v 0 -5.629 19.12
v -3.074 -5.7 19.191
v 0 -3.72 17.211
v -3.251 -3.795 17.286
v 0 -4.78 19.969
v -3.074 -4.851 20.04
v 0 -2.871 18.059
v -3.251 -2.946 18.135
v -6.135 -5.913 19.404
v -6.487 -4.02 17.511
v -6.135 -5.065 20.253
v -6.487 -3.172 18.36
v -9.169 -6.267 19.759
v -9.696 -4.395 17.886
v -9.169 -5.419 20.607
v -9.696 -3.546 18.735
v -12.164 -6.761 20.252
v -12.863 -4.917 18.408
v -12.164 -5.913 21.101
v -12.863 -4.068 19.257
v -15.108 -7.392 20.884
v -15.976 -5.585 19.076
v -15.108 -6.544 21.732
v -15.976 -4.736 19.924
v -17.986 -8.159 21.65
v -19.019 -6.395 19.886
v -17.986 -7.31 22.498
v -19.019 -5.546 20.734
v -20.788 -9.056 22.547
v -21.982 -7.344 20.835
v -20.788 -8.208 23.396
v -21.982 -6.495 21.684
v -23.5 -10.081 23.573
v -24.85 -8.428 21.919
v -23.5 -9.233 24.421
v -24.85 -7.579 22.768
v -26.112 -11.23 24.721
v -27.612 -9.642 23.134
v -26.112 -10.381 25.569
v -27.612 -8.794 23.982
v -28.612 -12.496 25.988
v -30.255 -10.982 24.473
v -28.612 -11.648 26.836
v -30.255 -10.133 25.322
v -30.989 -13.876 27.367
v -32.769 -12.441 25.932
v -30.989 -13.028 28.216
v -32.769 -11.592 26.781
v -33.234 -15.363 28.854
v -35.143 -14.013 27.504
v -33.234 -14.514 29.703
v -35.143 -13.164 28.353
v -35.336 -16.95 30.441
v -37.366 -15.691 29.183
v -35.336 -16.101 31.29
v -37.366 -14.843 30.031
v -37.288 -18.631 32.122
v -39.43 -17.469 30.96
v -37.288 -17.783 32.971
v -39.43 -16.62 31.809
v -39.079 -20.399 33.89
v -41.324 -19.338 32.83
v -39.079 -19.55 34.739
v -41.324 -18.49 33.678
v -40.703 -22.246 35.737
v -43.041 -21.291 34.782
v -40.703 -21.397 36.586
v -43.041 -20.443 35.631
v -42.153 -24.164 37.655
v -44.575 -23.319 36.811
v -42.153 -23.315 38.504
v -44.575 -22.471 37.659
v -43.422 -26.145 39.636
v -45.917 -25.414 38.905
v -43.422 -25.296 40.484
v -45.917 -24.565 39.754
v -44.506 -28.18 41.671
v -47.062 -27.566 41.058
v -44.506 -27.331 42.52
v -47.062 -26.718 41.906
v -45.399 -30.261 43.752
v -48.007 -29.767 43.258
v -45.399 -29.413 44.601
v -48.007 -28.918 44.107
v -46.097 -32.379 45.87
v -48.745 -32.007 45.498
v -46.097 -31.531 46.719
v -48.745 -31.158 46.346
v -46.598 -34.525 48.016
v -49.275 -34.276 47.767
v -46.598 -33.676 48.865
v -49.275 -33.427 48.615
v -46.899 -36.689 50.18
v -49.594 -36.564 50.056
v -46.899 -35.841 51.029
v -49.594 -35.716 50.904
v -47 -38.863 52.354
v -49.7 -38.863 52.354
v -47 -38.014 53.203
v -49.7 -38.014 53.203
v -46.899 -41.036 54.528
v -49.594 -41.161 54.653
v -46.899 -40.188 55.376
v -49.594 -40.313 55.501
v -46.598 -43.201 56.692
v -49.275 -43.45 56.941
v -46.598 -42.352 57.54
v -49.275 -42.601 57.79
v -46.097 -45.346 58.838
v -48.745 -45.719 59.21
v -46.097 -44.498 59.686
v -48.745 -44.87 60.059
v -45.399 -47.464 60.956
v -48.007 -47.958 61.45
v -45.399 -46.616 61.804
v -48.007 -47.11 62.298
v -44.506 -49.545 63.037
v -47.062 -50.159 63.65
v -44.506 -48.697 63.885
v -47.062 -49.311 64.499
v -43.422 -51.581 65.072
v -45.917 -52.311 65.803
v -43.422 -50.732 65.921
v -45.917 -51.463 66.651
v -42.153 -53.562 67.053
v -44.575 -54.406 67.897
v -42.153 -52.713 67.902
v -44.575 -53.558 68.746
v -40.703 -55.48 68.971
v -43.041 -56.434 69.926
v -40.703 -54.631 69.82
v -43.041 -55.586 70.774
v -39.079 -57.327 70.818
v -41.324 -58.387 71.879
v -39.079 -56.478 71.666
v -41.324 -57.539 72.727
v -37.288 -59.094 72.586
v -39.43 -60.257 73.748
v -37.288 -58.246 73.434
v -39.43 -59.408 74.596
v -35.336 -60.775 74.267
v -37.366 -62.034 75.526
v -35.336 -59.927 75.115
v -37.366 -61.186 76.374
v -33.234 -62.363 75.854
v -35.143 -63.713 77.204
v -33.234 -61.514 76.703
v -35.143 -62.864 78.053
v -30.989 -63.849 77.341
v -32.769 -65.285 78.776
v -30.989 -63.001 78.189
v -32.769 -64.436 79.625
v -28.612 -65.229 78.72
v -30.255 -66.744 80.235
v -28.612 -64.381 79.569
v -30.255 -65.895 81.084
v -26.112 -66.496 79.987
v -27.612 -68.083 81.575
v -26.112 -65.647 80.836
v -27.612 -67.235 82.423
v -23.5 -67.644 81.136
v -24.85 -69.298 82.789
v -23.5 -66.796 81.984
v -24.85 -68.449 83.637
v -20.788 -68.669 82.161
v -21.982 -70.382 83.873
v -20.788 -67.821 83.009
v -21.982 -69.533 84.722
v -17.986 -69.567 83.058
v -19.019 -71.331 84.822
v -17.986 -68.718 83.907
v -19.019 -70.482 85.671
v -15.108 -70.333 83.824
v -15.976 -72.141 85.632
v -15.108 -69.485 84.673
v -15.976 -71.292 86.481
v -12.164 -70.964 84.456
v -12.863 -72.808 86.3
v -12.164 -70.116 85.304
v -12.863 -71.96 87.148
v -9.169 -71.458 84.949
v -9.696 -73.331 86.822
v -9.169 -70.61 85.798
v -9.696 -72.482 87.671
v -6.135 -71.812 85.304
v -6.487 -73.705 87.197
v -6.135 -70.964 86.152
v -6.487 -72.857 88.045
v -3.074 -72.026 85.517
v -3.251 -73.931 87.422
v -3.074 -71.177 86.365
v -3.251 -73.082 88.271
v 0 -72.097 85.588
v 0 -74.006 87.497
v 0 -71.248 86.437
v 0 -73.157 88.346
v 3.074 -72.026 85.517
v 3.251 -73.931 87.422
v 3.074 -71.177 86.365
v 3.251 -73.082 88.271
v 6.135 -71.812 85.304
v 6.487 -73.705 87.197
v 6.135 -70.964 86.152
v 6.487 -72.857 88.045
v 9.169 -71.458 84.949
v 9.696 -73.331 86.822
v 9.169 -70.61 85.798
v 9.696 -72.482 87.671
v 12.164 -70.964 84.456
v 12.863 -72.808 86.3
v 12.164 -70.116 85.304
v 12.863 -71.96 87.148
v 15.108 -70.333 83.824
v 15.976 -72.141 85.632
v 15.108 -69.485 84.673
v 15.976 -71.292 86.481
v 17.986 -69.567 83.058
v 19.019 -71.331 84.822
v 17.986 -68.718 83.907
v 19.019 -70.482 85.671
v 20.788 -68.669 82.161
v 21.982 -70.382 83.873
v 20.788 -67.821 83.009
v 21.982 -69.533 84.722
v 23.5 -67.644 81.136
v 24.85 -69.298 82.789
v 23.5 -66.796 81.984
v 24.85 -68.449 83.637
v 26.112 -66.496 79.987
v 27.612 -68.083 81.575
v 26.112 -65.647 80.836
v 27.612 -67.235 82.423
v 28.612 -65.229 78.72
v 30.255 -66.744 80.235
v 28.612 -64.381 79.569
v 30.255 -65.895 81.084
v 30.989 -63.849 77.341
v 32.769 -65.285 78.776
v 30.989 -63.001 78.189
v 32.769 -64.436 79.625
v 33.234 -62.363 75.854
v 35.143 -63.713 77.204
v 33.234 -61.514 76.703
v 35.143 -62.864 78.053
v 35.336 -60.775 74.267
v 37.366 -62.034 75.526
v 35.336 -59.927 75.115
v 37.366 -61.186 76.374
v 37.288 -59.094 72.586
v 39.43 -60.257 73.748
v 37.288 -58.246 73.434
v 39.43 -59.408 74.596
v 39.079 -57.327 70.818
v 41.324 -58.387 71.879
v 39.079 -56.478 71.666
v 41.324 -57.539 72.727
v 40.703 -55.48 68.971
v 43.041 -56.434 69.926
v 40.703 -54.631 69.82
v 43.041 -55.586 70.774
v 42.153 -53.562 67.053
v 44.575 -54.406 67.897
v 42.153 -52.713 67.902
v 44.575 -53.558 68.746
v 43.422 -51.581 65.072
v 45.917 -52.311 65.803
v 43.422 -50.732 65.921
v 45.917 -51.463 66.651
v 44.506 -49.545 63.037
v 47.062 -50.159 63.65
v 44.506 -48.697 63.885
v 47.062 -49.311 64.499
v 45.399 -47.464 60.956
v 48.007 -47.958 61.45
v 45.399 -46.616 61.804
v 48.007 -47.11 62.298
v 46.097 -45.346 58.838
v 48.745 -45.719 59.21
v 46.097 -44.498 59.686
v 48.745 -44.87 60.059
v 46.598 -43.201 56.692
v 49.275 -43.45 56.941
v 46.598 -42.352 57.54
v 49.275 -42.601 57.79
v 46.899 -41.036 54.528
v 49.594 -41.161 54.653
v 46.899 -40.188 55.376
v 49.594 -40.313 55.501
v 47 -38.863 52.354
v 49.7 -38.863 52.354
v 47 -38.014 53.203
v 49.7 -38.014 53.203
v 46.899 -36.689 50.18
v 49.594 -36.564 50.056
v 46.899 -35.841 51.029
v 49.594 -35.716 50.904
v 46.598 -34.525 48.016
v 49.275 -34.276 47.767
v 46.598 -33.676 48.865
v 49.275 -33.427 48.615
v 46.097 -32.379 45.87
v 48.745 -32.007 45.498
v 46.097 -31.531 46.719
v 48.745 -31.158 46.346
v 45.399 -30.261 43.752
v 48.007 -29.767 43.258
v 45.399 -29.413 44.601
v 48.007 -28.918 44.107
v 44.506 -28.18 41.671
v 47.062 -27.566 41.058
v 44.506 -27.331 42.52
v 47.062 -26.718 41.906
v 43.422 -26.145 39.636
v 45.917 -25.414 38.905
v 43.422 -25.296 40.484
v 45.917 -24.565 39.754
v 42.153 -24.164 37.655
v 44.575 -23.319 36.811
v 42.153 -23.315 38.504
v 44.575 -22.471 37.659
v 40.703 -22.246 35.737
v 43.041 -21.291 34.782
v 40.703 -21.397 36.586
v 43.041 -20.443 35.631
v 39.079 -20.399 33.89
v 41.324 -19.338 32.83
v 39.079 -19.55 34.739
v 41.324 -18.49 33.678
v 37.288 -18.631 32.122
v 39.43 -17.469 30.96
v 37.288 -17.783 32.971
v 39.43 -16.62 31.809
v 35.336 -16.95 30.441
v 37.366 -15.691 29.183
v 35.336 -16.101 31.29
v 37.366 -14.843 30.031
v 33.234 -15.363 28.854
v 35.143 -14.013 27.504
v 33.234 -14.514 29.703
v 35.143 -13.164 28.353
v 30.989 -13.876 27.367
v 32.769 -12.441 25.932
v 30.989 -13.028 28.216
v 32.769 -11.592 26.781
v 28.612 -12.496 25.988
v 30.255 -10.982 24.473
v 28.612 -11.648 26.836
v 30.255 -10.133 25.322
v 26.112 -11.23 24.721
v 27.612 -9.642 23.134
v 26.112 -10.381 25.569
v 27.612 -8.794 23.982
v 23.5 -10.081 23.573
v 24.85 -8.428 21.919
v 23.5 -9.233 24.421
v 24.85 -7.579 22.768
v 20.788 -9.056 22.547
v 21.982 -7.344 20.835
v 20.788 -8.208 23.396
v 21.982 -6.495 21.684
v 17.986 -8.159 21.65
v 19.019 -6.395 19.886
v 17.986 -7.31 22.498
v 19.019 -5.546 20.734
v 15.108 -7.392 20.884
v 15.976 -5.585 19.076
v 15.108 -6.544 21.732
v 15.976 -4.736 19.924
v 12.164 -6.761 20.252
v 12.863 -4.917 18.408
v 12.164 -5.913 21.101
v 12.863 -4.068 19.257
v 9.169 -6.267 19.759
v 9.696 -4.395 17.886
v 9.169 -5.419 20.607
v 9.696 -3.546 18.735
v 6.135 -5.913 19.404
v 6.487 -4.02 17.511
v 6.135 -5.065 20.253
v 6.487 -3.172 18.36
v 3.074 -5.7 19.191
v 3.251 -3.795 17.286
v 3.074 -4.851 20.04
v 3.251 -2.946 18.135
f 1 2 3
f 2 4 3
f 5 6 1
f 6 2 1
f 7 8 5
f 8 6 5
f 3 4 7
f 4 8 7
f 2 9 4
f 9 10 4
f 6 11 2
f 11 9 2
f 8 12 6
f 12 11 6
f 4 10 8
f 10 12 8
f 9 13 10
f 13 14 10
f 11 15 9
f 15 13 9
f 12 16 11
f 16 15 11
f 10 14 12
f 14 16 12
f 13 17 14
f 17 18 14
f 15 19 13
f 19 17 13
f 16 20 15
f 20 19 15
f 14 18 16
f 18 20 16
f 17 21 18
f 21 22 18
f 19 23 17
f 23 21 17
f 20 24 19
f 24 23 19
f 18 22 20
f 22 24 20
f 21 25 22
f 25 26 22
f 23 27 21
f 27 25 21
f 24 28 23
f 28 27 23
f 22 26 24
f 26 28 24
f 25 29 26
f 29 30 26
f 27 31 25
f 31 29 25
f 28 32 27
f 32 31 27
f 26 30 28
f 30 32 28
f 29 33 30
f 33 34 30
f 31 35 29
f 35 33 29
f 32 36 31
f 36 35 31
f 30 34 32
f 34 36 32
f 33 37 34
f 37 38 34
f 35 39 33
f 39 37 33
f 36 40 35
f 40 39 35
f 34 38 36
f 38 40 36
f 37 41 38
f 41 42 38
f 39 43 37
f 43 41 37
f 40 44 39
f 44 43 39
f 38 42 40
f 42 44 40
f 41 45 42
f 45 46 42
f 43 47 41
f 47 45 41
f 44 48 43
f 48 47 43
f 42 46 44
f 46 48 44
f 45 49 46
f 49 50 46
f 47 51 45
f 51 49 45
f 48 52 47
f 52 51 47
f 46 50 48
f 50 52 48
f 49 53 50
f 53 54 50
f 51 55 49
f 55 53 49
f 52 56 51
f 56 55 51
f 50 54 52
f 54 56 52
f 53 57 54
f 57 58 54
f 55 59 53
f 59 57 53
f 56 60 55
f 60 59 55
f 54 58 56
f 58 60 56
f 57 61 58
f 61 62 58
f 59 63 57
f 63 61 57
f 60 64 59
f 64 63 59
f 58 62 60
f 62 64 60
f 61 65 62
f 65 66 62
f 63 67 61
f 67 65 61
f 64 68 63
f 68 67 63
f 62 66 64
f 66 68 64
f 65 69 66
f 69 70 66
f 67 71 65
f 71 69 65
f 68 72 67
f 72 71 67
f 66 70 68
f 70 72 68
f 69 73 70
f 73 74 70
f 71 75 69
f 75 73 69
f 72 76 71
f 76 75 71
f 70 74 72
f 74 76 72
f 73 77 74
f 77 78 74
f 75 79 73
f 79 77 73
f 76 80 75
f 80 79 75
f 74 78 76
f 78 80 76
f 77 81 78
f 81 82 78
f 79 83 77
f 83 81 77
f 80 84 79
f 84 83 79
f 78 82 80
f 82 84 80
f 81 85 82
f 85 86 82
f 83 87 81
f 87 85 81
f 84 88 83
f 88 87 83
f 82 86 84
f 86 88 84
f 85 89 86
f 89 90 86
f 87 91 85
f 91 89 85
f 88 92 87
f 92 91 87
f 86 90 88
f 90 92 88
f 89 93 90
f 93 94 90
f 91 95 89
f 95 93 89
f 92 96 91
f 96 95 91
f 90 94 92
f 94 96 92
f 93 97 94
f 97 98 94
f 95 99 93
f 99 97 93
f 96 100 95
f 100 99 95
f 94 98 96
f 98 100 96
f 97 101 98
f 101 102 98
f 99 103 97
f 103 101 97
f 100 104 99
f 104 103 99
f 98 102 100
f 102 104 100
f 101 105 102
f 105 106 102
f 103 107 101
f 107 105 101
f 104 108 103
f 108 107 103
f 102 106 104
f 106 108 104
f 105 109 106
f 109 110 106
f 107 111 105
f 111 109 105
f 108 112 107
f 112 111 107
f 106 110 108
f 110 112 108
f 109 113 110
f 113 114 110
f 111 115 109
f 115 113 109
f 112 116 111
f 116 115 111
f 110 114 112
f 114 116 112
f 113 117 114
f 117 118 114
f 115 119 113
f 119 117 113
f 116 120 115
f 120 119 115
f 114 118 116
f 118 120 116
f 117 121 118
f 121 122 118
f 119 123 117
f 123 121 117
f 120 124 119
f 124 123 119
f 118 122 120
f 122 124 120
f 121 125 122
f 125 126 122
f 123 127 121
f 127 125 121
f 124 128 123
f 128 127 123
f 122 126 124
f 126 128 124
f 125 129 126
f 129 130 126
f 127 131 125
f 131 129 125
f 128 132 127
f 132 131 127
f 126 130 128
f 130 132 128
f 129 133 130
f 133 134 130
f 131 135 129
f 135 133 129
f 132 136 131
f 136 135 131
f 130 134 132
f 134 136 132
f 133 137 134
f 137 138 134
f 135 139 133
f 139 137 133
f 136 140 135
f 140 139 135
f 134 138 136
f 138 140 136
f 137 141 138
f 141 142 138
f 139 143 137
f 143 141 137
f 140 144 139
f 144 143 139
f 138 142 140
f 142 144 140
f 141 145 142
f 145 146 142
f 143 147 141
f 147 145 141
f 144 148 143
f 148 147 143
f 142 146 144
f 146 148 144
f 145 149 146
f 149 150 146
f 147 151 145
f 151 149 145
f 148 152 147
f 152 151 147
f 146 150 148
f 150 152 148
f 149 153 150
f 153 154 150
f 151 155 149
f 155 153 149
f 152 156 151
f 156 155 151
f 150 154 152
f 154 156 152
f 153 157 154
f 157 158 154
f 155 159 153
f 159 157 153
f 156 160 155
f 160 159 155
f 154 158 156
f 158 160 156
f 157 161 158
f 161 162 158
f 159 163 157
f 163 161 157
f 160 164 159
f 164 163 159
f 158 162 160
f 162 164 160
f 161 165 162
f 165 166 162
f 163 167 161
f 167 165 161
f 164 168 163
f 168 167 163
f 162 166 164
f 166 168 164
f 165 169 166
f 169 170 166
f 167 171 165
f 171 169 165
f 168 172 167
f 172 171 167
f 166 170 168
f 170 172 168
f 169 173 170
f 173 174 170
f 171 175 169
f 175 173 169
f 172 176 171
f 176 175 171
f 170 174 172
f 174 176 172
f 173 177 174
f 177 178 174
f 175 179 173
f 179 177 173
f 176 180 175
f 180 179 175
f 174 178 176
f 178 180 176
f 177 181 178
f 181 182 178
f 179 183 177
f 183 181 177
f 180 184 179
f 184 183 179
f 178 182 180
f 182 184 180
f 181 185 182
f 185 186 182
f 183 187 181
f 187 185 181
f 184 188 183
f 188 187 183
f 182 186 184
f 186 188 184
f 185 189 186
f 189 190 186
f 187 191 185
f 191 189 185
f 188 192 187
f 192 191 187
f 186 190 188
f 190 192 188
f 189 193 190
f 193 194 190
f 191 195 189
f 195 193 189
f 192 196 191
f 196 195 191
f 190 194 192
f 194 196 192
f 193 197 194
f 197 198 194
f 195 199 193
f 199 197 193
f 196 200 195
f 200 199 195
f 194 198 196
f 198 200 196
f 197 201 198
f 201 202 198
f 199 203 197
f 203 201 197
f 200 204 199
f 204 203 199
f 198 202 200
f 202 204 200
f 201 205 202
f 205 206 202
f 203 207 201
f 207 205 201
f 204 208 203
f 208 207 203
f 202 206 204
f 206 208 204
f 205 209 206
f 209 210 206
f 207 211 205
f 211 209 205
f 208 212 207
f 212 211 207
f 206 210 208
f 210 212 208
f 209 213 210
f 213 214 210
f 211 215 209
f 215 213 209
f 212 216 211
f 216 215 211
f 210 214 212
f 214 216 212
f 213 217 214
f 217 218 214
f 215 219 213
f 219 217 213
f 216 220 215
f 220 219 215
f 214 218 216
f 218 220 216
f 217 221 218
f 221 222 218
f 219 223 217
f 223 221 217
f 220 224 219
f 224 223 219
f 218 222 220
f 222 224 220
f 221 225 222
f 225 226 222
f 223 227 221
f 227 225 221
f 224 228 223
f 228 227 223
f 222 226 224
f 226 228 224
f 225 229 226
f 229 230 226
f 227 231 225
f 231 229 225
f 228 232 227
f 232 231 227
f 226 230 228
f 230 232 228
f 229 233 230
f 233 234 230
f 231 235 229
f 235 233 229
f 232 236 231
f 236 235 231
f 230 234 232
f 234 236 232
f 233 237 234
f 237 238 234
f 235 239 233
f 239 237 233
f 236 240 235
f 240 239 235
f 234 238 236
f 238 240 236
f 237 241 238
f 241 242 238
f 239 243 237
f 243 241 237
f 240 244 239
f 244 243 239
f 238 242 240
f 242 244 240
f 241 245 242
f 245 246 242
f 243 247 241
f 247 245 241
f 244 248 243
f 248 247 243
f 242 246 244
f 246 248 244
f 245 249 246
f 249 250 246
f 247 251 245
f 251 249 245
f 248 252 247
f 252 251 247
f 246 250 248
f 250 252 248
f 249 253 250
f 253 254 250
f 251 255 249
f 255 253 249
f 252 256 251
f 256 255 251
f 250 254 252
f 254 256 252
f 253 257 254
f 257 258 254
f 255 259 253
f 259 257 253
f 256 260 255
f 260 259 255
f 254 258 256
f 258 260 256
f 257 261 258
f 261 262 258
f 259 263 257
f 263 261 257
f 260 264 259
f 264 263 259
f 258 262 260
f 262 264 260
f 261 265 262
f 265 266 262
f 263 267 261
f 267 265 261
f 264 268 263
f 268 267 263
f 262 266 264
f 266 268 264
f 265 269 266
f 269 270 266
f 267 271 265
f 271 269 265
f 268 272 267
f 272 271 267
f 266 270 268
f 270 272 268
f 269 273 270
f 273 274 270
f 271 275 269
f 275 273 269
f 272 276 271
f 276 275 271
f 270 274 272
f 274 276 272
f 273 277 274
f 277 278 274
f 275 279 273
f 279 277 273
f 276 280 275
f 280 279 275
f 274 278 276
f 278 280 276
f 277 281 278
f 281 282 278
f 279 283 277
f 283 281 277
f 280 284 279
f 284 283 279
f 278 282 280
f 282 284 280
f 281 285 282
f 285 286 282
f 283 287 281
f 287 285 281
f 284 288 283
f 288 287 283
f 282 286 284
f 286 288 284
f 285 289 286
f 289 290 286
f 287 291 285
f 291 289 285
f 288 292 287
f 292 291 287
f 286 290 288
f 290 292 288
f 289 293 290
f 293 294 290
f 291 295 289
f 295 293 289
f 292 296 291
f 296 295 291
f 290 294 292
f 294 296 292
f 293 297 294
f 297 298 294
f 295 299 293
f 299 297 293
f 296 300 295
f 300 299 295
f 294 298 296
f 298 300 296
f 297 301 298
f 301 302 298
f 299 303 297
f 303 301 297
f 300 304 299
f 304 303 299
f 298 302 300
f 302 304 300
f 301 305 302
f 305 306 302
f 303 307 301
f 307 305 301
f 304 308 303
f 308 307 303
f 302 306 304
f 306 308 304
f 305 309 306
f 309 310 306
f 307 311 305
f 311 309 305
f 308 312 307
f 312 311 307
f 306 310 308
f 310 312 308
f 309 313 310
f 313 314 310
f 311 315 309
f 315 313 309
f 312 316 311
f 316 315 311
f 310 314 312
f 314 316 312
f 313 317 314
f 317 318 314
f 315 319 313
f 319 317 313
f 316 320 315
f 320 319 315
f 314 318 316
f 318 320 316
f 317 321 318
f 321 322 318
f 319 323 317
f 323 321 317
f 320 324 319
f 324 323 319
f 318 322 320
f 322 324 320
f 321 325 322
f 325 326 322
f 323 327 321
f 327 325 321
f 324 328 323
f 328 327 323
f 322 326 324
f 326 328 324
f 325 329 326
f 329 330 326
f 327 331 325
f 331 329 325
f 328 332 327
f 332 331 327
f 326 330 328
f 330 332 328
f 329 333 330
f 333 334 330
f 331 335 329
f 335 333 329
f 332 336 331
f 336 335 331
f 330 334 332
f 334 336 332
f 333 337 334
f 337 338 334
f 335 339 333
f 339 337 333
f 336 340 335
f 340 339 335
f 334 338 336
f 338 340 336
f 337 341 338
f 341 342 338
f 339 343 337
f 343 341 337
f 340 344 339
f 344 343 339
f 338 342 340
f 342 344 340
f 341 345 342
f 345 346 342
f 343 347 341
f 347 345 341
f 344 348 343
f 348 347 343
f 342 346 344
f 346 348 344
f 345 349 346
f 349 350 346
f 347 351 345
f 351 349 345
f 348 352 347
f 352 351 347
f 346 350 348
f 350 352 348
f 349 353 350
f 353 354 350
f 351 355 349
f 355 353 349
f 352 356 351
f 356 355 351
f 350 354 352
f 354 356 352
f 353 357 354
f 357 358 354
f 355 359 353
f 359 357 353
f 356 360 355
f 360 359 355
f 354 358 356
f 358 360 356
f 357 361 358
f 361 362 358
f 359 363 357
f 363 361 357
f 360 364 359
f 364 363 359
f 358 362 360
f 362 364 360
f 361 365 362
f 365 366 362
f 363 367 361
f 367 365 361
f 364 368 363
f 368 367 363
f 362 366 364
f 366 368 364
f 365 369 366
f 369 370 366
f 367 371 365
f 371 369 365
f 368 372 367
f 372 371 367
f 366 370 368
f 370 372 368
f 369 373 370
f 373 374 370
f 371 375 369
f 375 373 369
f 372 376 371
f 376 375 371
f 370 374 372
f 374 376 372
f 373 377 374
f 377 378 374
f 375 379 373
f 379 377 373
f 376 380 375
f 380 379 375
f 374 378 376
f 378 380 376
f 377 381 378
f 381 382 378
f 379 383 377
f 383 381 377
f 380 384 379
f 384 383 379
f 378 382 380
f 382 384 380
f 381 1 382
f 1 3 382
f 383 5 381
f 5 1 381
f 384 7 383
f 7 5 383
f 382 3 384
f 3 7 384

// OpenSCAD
include <../lib/servo-duct-manifold-lib.scad>;
$fn = 96;
cubic_cell_3_gasket();
